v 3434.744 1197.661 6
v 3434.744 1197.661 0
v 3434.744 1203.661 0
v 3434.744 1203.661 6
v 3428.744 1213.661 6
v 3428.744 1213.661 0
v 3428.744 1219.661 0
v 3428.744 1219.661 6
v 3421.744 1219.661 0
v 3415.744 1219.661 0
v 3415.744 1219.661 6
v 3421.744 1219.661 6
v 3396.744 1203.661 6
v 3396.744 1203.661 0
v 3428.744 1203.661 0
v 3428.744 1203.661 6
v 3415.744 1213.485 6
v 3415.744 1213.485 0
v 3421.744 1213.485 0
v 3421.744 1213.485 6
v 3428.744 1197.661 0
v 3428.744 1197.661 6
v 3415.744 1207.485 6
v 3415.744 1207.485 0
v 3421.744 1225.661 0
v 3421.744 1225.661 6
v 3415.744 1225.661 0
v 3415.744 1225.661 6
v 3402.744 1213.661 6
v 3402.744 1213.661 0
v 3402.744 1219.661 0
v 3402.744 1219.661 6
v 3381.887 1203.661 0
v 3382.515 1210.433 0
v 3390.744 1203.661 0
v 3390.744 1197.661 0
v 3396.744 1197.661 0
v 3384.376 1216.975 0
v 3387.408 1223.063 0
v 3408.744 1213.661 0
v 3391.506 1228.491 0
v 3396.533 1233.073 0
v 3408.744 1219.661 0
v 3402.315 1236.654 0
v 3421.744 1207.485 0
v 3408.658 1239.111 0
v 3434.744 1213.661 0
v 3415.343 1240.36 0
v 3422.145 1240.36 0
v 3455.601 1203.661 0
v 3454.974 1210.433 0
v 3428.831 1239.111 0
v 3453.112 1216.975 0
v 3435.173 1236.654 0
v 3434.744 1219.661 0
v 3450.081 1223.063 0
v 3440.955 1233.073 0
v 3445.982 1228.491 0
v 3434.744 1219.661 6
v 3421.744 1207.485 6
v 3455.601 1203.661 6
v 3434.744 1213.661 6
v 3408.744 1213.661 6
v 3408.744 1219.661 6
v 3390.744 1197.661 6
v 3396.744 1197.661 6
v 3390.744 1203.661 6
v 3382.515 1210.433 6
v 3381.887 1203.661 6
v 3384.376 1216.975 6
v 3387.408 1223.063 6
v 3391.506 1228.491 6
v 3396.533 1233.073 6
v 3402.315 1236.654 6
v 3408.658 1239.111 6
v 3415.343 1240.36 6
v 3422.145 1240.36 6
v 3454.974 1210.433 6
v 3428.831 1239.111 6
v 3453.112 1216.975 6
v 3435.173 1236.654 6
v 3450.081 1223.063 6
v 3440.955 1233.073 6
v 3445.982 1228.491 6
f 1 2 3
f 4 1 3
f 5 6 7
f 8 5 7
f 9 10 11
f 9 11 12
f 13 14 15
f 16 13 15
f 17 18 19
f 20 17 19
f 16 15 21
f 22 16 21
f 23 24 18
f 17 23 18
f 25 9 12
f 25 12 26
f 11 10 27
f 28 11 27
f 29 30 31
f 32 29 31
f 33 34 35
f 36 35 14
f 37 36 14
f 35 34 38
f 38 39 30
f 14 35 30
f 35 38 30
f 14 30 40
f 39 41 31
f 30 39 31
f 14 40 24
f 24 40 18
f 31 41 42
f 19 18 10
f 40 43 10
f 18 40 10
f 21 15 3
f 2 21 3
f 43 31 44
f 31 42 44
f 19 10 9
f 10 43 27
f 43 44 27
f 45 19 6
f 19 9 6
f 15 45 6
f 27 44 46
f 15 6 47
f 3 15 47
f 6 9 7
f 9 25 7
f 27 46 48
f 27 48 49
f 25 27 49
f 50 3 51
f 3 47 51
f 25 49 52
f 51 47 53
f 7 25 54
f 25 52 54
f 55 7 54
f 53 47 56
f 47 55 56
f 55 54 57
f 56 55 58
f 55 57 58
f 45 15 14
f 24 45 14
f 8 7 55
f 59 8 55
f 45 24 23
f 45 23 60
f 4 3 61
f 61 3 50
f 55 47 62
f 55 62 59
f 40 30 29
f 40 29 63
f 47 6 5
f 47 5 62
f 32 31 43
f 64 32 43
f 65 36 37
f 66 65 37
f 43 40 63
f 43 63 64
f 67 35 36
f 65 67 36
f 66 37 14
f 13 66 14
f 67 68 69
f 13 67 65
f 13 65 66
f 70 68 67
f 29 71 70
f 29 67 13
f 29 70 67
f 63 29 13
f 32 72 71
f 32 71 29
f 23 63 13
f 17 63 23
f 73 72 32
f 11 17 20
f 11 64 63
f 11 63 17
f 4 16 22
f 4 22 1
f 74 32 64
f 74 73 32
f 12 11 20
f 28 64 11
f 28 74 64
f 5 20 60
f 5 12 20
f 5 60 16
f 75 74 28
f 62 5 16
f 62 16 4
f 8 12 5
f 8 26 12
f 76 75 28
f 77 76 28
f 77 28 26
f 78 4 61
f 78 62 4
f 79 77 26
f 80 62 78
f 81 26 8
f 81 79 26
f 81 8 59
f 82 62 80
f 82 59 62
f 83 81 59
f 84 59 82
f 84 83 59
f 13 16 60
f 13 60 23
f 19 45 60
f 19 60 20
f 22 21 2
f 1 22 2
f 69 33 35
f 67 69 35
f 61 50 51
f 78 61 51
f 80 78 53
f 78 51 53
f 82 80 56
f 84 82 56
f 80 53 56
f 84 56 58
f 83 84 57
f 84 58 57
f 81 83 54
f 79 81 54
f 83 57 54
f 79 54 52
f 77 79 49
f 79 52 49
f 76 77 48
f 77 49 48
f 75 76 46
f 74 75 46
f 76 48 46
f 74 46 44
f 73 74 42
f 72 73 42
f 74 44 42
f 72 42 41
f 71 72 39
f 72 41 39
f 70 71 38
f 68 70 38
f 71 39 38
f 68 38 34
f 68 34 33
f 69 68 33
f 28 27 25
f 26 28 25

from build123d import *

# Parameters (mm, degrees)
MODEL_W             = 6
MODEL_H             = 6
BOSS_EXTRUDE1_DEPTH = 6


with BuildPart() as part:
    # Model → Boss-Extrude1 (new body)
    with BuildSketch(Plane.XY):
        with BuildLine():
            Line((3428.744099931, 1203.660512719), (3428.744099931, 1197.660512719))
            Line((3428.744099931, 1197.660512719), (3434.744099931, 1197.660512719))
            Line((3434.744099931, 1197.660512719), (3434.744099931, 1203.660512719))
            Line((3434.744099931, 1203.660512719), (3455.601242788, 1203.660512719))
            ThreePointArc((3455.601242788, 1203.660512719), (3418.744099931, 1240.517655576), (3381.886957074, 1203.660512719))
            Line((3381.886957074, 1203.660512719), (3390.744099931, 1203.660512719))
            Line((3390.744099931, 1203.660512719), (3390.744099931, 1197.660512719))
            Line((3390.744099931, 1197.660512719), (3396.744099931, 1197.660512719))
            Line((3396.744099931, 1197.660512719), (3396.744099931, 1203.660512719))
            Line((3396.744099931, 1203.660512719), (3428.744099931, 1203.660512719))
        make_face()
        with Locations((3431.744099931, 1216.660512719)):
            Rectangle(MODEL_W, MODEL_H, mode=Mode.SUBTRACT)
        with Locations((3405.744099931, 1216.660512719)):
            Rectangle(MODEL_W, MODEL_H, mode=Mode.SUBTRACT)
        with Locations((3418.744099931, 1222.660512719)):
            Rectangle(MODEL_W, MODEL_H, mode=Mode.SUBTRACT)
        with Locations((3418.744099931, 1210.484971552)):
            Rectangle(MODEL_W, MODEL_H, mode=Mode.SUBTRACT)
    extrude(amount=BOSS_EXTRUDE1_DEPTH)


solid = part.part
